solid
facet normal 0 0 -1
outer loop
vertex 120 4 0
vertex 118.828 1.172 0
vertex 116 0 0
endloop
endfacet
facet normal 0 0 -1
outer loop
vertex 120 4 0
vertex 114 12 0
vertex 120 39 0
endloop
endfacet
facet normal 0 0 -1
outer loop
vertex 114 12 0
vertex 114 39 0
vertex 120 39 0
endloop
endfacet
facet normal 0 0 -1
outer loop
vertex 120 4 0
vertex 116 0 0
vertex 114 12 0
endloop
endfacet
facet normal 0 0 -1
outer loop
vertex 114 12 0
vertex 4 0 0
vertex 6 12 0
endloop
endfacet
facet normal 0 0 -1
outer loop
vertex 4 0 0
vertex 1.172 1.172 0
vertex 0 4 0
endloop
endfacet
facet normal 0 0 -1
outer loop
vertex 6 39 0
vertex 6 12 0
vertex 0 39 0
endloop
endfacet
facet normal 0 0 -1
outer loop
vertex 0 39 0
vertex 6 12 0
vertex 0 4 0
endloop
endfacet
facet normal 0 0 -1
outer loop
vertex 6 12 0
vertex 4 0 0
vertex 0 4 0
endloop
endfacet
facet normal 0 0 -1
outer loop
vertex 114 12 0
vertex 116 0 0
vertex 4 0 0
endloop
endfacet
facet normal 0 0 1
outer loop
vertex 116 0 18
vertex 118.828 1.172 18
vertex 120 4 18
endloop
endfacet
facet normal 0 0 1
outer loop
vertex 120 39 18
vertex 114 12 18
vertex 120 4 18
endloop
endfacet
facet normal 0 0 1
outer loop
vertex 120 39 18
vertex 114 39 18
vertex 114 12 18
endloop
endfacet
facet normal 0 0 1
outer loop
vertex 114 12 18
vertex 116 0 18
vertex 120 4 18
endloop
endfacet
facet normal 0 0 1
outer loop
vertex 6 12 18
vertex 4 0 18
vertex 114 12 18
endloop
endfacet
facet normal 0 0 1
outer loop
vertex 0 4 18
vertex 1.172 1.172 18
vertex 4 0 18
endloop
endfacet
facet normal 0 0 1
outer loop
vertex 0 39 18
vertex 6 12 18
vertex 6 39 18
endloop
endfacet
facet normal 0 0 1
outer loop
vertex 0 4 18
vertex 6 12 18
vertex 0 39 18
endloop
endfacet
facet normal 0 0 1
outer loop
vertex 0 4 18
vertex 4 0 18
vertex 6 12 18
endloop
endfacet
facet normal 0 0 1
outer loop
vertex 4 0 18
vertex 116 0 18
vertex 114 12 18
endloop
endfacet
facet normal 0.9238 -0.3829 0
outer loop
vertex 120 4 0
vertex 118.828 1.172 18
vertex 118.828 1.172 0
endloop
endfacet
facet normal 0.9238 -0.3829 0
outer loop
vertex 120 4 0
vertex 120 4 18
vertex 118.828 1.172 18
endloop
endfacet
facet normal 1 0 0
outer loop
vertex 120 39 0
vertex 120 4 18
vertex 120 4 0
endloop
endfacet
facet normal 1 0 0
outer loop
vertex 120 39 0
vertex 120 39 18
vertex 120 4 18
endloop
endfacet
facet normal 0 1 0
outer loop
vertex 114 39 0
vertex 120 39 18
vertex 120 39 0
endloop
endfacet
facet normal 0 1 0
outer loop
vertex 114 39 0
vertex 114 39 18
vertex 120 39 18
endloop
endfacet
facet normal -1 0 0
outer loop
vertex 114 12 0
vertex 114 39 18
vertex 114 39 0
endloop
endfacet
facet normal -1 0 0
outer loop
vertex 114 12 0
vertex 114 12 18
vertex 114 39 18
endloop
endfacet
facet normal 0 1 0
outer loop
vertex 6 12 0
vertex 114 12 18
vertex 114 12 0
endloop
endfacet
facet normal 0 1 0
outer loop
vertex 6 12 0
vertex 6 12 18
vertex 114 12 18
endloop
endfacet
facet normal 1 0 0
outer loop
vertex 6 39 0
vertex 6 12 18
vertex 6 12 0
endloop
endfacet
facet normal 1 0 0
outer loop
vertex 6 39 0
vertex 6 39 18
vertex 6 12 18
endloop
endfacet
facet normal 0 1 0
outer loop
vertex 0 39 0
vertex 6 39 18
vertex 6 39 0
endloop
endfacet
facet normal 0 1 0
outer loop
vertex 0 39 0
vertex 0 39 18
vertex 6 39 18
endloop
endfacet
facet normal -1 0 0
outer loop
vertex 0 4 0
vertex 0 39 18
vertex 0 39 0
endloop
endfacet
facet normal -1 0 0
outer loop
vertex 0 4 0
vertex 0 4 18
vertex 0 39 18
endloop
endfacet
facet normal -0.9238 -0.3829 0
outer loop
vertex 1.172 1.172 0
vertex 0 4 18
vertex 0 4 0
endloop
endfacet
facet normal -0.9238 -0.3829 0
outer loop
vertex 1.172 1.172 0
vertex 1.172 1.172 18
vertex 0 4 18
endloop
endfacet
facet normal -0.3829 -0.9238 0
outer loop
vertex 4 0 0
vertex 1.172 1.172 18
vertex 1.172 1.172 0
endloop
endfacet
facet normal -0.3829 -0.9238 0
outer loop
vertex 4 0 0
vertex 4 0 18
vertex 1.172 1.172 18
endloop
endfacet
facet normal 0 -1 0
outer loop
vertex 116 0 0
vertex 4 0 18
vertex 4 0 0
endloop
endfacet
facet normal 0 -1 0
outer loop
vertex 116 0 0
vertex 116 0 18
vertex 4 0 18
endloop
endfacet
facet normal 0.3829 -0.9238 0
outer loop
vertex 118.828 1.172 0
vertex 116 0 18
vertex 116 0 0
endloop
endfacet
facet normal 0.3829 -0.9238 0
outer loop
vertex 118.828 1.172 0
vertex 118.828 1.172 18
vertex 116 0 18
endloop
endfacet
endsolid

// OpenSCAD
$fn = 32;

// ----------------------------------------------------------------------
// Heat sink frame: 120 x 39 mm frame, 6 mm walls
// ----------------------------------------------------------------------

// --- parameters (mm) ---
profile_height = 18;      // extrusion height
profile_points = 12;      // points of the closed outline

profile = [[0, 4], [1.172, 1.172], [4, 0], [116, 0], [118.828, 1.172], [120, 4], [120, 39], [114, 39], [114, 12], [6, 12], [6, 39], [0, 39]];  // single closed polygon, 12 points, counter clockwise

// --- the one profile operation ---
linear_extrude(height = profile_height) polygon(points = profile);
